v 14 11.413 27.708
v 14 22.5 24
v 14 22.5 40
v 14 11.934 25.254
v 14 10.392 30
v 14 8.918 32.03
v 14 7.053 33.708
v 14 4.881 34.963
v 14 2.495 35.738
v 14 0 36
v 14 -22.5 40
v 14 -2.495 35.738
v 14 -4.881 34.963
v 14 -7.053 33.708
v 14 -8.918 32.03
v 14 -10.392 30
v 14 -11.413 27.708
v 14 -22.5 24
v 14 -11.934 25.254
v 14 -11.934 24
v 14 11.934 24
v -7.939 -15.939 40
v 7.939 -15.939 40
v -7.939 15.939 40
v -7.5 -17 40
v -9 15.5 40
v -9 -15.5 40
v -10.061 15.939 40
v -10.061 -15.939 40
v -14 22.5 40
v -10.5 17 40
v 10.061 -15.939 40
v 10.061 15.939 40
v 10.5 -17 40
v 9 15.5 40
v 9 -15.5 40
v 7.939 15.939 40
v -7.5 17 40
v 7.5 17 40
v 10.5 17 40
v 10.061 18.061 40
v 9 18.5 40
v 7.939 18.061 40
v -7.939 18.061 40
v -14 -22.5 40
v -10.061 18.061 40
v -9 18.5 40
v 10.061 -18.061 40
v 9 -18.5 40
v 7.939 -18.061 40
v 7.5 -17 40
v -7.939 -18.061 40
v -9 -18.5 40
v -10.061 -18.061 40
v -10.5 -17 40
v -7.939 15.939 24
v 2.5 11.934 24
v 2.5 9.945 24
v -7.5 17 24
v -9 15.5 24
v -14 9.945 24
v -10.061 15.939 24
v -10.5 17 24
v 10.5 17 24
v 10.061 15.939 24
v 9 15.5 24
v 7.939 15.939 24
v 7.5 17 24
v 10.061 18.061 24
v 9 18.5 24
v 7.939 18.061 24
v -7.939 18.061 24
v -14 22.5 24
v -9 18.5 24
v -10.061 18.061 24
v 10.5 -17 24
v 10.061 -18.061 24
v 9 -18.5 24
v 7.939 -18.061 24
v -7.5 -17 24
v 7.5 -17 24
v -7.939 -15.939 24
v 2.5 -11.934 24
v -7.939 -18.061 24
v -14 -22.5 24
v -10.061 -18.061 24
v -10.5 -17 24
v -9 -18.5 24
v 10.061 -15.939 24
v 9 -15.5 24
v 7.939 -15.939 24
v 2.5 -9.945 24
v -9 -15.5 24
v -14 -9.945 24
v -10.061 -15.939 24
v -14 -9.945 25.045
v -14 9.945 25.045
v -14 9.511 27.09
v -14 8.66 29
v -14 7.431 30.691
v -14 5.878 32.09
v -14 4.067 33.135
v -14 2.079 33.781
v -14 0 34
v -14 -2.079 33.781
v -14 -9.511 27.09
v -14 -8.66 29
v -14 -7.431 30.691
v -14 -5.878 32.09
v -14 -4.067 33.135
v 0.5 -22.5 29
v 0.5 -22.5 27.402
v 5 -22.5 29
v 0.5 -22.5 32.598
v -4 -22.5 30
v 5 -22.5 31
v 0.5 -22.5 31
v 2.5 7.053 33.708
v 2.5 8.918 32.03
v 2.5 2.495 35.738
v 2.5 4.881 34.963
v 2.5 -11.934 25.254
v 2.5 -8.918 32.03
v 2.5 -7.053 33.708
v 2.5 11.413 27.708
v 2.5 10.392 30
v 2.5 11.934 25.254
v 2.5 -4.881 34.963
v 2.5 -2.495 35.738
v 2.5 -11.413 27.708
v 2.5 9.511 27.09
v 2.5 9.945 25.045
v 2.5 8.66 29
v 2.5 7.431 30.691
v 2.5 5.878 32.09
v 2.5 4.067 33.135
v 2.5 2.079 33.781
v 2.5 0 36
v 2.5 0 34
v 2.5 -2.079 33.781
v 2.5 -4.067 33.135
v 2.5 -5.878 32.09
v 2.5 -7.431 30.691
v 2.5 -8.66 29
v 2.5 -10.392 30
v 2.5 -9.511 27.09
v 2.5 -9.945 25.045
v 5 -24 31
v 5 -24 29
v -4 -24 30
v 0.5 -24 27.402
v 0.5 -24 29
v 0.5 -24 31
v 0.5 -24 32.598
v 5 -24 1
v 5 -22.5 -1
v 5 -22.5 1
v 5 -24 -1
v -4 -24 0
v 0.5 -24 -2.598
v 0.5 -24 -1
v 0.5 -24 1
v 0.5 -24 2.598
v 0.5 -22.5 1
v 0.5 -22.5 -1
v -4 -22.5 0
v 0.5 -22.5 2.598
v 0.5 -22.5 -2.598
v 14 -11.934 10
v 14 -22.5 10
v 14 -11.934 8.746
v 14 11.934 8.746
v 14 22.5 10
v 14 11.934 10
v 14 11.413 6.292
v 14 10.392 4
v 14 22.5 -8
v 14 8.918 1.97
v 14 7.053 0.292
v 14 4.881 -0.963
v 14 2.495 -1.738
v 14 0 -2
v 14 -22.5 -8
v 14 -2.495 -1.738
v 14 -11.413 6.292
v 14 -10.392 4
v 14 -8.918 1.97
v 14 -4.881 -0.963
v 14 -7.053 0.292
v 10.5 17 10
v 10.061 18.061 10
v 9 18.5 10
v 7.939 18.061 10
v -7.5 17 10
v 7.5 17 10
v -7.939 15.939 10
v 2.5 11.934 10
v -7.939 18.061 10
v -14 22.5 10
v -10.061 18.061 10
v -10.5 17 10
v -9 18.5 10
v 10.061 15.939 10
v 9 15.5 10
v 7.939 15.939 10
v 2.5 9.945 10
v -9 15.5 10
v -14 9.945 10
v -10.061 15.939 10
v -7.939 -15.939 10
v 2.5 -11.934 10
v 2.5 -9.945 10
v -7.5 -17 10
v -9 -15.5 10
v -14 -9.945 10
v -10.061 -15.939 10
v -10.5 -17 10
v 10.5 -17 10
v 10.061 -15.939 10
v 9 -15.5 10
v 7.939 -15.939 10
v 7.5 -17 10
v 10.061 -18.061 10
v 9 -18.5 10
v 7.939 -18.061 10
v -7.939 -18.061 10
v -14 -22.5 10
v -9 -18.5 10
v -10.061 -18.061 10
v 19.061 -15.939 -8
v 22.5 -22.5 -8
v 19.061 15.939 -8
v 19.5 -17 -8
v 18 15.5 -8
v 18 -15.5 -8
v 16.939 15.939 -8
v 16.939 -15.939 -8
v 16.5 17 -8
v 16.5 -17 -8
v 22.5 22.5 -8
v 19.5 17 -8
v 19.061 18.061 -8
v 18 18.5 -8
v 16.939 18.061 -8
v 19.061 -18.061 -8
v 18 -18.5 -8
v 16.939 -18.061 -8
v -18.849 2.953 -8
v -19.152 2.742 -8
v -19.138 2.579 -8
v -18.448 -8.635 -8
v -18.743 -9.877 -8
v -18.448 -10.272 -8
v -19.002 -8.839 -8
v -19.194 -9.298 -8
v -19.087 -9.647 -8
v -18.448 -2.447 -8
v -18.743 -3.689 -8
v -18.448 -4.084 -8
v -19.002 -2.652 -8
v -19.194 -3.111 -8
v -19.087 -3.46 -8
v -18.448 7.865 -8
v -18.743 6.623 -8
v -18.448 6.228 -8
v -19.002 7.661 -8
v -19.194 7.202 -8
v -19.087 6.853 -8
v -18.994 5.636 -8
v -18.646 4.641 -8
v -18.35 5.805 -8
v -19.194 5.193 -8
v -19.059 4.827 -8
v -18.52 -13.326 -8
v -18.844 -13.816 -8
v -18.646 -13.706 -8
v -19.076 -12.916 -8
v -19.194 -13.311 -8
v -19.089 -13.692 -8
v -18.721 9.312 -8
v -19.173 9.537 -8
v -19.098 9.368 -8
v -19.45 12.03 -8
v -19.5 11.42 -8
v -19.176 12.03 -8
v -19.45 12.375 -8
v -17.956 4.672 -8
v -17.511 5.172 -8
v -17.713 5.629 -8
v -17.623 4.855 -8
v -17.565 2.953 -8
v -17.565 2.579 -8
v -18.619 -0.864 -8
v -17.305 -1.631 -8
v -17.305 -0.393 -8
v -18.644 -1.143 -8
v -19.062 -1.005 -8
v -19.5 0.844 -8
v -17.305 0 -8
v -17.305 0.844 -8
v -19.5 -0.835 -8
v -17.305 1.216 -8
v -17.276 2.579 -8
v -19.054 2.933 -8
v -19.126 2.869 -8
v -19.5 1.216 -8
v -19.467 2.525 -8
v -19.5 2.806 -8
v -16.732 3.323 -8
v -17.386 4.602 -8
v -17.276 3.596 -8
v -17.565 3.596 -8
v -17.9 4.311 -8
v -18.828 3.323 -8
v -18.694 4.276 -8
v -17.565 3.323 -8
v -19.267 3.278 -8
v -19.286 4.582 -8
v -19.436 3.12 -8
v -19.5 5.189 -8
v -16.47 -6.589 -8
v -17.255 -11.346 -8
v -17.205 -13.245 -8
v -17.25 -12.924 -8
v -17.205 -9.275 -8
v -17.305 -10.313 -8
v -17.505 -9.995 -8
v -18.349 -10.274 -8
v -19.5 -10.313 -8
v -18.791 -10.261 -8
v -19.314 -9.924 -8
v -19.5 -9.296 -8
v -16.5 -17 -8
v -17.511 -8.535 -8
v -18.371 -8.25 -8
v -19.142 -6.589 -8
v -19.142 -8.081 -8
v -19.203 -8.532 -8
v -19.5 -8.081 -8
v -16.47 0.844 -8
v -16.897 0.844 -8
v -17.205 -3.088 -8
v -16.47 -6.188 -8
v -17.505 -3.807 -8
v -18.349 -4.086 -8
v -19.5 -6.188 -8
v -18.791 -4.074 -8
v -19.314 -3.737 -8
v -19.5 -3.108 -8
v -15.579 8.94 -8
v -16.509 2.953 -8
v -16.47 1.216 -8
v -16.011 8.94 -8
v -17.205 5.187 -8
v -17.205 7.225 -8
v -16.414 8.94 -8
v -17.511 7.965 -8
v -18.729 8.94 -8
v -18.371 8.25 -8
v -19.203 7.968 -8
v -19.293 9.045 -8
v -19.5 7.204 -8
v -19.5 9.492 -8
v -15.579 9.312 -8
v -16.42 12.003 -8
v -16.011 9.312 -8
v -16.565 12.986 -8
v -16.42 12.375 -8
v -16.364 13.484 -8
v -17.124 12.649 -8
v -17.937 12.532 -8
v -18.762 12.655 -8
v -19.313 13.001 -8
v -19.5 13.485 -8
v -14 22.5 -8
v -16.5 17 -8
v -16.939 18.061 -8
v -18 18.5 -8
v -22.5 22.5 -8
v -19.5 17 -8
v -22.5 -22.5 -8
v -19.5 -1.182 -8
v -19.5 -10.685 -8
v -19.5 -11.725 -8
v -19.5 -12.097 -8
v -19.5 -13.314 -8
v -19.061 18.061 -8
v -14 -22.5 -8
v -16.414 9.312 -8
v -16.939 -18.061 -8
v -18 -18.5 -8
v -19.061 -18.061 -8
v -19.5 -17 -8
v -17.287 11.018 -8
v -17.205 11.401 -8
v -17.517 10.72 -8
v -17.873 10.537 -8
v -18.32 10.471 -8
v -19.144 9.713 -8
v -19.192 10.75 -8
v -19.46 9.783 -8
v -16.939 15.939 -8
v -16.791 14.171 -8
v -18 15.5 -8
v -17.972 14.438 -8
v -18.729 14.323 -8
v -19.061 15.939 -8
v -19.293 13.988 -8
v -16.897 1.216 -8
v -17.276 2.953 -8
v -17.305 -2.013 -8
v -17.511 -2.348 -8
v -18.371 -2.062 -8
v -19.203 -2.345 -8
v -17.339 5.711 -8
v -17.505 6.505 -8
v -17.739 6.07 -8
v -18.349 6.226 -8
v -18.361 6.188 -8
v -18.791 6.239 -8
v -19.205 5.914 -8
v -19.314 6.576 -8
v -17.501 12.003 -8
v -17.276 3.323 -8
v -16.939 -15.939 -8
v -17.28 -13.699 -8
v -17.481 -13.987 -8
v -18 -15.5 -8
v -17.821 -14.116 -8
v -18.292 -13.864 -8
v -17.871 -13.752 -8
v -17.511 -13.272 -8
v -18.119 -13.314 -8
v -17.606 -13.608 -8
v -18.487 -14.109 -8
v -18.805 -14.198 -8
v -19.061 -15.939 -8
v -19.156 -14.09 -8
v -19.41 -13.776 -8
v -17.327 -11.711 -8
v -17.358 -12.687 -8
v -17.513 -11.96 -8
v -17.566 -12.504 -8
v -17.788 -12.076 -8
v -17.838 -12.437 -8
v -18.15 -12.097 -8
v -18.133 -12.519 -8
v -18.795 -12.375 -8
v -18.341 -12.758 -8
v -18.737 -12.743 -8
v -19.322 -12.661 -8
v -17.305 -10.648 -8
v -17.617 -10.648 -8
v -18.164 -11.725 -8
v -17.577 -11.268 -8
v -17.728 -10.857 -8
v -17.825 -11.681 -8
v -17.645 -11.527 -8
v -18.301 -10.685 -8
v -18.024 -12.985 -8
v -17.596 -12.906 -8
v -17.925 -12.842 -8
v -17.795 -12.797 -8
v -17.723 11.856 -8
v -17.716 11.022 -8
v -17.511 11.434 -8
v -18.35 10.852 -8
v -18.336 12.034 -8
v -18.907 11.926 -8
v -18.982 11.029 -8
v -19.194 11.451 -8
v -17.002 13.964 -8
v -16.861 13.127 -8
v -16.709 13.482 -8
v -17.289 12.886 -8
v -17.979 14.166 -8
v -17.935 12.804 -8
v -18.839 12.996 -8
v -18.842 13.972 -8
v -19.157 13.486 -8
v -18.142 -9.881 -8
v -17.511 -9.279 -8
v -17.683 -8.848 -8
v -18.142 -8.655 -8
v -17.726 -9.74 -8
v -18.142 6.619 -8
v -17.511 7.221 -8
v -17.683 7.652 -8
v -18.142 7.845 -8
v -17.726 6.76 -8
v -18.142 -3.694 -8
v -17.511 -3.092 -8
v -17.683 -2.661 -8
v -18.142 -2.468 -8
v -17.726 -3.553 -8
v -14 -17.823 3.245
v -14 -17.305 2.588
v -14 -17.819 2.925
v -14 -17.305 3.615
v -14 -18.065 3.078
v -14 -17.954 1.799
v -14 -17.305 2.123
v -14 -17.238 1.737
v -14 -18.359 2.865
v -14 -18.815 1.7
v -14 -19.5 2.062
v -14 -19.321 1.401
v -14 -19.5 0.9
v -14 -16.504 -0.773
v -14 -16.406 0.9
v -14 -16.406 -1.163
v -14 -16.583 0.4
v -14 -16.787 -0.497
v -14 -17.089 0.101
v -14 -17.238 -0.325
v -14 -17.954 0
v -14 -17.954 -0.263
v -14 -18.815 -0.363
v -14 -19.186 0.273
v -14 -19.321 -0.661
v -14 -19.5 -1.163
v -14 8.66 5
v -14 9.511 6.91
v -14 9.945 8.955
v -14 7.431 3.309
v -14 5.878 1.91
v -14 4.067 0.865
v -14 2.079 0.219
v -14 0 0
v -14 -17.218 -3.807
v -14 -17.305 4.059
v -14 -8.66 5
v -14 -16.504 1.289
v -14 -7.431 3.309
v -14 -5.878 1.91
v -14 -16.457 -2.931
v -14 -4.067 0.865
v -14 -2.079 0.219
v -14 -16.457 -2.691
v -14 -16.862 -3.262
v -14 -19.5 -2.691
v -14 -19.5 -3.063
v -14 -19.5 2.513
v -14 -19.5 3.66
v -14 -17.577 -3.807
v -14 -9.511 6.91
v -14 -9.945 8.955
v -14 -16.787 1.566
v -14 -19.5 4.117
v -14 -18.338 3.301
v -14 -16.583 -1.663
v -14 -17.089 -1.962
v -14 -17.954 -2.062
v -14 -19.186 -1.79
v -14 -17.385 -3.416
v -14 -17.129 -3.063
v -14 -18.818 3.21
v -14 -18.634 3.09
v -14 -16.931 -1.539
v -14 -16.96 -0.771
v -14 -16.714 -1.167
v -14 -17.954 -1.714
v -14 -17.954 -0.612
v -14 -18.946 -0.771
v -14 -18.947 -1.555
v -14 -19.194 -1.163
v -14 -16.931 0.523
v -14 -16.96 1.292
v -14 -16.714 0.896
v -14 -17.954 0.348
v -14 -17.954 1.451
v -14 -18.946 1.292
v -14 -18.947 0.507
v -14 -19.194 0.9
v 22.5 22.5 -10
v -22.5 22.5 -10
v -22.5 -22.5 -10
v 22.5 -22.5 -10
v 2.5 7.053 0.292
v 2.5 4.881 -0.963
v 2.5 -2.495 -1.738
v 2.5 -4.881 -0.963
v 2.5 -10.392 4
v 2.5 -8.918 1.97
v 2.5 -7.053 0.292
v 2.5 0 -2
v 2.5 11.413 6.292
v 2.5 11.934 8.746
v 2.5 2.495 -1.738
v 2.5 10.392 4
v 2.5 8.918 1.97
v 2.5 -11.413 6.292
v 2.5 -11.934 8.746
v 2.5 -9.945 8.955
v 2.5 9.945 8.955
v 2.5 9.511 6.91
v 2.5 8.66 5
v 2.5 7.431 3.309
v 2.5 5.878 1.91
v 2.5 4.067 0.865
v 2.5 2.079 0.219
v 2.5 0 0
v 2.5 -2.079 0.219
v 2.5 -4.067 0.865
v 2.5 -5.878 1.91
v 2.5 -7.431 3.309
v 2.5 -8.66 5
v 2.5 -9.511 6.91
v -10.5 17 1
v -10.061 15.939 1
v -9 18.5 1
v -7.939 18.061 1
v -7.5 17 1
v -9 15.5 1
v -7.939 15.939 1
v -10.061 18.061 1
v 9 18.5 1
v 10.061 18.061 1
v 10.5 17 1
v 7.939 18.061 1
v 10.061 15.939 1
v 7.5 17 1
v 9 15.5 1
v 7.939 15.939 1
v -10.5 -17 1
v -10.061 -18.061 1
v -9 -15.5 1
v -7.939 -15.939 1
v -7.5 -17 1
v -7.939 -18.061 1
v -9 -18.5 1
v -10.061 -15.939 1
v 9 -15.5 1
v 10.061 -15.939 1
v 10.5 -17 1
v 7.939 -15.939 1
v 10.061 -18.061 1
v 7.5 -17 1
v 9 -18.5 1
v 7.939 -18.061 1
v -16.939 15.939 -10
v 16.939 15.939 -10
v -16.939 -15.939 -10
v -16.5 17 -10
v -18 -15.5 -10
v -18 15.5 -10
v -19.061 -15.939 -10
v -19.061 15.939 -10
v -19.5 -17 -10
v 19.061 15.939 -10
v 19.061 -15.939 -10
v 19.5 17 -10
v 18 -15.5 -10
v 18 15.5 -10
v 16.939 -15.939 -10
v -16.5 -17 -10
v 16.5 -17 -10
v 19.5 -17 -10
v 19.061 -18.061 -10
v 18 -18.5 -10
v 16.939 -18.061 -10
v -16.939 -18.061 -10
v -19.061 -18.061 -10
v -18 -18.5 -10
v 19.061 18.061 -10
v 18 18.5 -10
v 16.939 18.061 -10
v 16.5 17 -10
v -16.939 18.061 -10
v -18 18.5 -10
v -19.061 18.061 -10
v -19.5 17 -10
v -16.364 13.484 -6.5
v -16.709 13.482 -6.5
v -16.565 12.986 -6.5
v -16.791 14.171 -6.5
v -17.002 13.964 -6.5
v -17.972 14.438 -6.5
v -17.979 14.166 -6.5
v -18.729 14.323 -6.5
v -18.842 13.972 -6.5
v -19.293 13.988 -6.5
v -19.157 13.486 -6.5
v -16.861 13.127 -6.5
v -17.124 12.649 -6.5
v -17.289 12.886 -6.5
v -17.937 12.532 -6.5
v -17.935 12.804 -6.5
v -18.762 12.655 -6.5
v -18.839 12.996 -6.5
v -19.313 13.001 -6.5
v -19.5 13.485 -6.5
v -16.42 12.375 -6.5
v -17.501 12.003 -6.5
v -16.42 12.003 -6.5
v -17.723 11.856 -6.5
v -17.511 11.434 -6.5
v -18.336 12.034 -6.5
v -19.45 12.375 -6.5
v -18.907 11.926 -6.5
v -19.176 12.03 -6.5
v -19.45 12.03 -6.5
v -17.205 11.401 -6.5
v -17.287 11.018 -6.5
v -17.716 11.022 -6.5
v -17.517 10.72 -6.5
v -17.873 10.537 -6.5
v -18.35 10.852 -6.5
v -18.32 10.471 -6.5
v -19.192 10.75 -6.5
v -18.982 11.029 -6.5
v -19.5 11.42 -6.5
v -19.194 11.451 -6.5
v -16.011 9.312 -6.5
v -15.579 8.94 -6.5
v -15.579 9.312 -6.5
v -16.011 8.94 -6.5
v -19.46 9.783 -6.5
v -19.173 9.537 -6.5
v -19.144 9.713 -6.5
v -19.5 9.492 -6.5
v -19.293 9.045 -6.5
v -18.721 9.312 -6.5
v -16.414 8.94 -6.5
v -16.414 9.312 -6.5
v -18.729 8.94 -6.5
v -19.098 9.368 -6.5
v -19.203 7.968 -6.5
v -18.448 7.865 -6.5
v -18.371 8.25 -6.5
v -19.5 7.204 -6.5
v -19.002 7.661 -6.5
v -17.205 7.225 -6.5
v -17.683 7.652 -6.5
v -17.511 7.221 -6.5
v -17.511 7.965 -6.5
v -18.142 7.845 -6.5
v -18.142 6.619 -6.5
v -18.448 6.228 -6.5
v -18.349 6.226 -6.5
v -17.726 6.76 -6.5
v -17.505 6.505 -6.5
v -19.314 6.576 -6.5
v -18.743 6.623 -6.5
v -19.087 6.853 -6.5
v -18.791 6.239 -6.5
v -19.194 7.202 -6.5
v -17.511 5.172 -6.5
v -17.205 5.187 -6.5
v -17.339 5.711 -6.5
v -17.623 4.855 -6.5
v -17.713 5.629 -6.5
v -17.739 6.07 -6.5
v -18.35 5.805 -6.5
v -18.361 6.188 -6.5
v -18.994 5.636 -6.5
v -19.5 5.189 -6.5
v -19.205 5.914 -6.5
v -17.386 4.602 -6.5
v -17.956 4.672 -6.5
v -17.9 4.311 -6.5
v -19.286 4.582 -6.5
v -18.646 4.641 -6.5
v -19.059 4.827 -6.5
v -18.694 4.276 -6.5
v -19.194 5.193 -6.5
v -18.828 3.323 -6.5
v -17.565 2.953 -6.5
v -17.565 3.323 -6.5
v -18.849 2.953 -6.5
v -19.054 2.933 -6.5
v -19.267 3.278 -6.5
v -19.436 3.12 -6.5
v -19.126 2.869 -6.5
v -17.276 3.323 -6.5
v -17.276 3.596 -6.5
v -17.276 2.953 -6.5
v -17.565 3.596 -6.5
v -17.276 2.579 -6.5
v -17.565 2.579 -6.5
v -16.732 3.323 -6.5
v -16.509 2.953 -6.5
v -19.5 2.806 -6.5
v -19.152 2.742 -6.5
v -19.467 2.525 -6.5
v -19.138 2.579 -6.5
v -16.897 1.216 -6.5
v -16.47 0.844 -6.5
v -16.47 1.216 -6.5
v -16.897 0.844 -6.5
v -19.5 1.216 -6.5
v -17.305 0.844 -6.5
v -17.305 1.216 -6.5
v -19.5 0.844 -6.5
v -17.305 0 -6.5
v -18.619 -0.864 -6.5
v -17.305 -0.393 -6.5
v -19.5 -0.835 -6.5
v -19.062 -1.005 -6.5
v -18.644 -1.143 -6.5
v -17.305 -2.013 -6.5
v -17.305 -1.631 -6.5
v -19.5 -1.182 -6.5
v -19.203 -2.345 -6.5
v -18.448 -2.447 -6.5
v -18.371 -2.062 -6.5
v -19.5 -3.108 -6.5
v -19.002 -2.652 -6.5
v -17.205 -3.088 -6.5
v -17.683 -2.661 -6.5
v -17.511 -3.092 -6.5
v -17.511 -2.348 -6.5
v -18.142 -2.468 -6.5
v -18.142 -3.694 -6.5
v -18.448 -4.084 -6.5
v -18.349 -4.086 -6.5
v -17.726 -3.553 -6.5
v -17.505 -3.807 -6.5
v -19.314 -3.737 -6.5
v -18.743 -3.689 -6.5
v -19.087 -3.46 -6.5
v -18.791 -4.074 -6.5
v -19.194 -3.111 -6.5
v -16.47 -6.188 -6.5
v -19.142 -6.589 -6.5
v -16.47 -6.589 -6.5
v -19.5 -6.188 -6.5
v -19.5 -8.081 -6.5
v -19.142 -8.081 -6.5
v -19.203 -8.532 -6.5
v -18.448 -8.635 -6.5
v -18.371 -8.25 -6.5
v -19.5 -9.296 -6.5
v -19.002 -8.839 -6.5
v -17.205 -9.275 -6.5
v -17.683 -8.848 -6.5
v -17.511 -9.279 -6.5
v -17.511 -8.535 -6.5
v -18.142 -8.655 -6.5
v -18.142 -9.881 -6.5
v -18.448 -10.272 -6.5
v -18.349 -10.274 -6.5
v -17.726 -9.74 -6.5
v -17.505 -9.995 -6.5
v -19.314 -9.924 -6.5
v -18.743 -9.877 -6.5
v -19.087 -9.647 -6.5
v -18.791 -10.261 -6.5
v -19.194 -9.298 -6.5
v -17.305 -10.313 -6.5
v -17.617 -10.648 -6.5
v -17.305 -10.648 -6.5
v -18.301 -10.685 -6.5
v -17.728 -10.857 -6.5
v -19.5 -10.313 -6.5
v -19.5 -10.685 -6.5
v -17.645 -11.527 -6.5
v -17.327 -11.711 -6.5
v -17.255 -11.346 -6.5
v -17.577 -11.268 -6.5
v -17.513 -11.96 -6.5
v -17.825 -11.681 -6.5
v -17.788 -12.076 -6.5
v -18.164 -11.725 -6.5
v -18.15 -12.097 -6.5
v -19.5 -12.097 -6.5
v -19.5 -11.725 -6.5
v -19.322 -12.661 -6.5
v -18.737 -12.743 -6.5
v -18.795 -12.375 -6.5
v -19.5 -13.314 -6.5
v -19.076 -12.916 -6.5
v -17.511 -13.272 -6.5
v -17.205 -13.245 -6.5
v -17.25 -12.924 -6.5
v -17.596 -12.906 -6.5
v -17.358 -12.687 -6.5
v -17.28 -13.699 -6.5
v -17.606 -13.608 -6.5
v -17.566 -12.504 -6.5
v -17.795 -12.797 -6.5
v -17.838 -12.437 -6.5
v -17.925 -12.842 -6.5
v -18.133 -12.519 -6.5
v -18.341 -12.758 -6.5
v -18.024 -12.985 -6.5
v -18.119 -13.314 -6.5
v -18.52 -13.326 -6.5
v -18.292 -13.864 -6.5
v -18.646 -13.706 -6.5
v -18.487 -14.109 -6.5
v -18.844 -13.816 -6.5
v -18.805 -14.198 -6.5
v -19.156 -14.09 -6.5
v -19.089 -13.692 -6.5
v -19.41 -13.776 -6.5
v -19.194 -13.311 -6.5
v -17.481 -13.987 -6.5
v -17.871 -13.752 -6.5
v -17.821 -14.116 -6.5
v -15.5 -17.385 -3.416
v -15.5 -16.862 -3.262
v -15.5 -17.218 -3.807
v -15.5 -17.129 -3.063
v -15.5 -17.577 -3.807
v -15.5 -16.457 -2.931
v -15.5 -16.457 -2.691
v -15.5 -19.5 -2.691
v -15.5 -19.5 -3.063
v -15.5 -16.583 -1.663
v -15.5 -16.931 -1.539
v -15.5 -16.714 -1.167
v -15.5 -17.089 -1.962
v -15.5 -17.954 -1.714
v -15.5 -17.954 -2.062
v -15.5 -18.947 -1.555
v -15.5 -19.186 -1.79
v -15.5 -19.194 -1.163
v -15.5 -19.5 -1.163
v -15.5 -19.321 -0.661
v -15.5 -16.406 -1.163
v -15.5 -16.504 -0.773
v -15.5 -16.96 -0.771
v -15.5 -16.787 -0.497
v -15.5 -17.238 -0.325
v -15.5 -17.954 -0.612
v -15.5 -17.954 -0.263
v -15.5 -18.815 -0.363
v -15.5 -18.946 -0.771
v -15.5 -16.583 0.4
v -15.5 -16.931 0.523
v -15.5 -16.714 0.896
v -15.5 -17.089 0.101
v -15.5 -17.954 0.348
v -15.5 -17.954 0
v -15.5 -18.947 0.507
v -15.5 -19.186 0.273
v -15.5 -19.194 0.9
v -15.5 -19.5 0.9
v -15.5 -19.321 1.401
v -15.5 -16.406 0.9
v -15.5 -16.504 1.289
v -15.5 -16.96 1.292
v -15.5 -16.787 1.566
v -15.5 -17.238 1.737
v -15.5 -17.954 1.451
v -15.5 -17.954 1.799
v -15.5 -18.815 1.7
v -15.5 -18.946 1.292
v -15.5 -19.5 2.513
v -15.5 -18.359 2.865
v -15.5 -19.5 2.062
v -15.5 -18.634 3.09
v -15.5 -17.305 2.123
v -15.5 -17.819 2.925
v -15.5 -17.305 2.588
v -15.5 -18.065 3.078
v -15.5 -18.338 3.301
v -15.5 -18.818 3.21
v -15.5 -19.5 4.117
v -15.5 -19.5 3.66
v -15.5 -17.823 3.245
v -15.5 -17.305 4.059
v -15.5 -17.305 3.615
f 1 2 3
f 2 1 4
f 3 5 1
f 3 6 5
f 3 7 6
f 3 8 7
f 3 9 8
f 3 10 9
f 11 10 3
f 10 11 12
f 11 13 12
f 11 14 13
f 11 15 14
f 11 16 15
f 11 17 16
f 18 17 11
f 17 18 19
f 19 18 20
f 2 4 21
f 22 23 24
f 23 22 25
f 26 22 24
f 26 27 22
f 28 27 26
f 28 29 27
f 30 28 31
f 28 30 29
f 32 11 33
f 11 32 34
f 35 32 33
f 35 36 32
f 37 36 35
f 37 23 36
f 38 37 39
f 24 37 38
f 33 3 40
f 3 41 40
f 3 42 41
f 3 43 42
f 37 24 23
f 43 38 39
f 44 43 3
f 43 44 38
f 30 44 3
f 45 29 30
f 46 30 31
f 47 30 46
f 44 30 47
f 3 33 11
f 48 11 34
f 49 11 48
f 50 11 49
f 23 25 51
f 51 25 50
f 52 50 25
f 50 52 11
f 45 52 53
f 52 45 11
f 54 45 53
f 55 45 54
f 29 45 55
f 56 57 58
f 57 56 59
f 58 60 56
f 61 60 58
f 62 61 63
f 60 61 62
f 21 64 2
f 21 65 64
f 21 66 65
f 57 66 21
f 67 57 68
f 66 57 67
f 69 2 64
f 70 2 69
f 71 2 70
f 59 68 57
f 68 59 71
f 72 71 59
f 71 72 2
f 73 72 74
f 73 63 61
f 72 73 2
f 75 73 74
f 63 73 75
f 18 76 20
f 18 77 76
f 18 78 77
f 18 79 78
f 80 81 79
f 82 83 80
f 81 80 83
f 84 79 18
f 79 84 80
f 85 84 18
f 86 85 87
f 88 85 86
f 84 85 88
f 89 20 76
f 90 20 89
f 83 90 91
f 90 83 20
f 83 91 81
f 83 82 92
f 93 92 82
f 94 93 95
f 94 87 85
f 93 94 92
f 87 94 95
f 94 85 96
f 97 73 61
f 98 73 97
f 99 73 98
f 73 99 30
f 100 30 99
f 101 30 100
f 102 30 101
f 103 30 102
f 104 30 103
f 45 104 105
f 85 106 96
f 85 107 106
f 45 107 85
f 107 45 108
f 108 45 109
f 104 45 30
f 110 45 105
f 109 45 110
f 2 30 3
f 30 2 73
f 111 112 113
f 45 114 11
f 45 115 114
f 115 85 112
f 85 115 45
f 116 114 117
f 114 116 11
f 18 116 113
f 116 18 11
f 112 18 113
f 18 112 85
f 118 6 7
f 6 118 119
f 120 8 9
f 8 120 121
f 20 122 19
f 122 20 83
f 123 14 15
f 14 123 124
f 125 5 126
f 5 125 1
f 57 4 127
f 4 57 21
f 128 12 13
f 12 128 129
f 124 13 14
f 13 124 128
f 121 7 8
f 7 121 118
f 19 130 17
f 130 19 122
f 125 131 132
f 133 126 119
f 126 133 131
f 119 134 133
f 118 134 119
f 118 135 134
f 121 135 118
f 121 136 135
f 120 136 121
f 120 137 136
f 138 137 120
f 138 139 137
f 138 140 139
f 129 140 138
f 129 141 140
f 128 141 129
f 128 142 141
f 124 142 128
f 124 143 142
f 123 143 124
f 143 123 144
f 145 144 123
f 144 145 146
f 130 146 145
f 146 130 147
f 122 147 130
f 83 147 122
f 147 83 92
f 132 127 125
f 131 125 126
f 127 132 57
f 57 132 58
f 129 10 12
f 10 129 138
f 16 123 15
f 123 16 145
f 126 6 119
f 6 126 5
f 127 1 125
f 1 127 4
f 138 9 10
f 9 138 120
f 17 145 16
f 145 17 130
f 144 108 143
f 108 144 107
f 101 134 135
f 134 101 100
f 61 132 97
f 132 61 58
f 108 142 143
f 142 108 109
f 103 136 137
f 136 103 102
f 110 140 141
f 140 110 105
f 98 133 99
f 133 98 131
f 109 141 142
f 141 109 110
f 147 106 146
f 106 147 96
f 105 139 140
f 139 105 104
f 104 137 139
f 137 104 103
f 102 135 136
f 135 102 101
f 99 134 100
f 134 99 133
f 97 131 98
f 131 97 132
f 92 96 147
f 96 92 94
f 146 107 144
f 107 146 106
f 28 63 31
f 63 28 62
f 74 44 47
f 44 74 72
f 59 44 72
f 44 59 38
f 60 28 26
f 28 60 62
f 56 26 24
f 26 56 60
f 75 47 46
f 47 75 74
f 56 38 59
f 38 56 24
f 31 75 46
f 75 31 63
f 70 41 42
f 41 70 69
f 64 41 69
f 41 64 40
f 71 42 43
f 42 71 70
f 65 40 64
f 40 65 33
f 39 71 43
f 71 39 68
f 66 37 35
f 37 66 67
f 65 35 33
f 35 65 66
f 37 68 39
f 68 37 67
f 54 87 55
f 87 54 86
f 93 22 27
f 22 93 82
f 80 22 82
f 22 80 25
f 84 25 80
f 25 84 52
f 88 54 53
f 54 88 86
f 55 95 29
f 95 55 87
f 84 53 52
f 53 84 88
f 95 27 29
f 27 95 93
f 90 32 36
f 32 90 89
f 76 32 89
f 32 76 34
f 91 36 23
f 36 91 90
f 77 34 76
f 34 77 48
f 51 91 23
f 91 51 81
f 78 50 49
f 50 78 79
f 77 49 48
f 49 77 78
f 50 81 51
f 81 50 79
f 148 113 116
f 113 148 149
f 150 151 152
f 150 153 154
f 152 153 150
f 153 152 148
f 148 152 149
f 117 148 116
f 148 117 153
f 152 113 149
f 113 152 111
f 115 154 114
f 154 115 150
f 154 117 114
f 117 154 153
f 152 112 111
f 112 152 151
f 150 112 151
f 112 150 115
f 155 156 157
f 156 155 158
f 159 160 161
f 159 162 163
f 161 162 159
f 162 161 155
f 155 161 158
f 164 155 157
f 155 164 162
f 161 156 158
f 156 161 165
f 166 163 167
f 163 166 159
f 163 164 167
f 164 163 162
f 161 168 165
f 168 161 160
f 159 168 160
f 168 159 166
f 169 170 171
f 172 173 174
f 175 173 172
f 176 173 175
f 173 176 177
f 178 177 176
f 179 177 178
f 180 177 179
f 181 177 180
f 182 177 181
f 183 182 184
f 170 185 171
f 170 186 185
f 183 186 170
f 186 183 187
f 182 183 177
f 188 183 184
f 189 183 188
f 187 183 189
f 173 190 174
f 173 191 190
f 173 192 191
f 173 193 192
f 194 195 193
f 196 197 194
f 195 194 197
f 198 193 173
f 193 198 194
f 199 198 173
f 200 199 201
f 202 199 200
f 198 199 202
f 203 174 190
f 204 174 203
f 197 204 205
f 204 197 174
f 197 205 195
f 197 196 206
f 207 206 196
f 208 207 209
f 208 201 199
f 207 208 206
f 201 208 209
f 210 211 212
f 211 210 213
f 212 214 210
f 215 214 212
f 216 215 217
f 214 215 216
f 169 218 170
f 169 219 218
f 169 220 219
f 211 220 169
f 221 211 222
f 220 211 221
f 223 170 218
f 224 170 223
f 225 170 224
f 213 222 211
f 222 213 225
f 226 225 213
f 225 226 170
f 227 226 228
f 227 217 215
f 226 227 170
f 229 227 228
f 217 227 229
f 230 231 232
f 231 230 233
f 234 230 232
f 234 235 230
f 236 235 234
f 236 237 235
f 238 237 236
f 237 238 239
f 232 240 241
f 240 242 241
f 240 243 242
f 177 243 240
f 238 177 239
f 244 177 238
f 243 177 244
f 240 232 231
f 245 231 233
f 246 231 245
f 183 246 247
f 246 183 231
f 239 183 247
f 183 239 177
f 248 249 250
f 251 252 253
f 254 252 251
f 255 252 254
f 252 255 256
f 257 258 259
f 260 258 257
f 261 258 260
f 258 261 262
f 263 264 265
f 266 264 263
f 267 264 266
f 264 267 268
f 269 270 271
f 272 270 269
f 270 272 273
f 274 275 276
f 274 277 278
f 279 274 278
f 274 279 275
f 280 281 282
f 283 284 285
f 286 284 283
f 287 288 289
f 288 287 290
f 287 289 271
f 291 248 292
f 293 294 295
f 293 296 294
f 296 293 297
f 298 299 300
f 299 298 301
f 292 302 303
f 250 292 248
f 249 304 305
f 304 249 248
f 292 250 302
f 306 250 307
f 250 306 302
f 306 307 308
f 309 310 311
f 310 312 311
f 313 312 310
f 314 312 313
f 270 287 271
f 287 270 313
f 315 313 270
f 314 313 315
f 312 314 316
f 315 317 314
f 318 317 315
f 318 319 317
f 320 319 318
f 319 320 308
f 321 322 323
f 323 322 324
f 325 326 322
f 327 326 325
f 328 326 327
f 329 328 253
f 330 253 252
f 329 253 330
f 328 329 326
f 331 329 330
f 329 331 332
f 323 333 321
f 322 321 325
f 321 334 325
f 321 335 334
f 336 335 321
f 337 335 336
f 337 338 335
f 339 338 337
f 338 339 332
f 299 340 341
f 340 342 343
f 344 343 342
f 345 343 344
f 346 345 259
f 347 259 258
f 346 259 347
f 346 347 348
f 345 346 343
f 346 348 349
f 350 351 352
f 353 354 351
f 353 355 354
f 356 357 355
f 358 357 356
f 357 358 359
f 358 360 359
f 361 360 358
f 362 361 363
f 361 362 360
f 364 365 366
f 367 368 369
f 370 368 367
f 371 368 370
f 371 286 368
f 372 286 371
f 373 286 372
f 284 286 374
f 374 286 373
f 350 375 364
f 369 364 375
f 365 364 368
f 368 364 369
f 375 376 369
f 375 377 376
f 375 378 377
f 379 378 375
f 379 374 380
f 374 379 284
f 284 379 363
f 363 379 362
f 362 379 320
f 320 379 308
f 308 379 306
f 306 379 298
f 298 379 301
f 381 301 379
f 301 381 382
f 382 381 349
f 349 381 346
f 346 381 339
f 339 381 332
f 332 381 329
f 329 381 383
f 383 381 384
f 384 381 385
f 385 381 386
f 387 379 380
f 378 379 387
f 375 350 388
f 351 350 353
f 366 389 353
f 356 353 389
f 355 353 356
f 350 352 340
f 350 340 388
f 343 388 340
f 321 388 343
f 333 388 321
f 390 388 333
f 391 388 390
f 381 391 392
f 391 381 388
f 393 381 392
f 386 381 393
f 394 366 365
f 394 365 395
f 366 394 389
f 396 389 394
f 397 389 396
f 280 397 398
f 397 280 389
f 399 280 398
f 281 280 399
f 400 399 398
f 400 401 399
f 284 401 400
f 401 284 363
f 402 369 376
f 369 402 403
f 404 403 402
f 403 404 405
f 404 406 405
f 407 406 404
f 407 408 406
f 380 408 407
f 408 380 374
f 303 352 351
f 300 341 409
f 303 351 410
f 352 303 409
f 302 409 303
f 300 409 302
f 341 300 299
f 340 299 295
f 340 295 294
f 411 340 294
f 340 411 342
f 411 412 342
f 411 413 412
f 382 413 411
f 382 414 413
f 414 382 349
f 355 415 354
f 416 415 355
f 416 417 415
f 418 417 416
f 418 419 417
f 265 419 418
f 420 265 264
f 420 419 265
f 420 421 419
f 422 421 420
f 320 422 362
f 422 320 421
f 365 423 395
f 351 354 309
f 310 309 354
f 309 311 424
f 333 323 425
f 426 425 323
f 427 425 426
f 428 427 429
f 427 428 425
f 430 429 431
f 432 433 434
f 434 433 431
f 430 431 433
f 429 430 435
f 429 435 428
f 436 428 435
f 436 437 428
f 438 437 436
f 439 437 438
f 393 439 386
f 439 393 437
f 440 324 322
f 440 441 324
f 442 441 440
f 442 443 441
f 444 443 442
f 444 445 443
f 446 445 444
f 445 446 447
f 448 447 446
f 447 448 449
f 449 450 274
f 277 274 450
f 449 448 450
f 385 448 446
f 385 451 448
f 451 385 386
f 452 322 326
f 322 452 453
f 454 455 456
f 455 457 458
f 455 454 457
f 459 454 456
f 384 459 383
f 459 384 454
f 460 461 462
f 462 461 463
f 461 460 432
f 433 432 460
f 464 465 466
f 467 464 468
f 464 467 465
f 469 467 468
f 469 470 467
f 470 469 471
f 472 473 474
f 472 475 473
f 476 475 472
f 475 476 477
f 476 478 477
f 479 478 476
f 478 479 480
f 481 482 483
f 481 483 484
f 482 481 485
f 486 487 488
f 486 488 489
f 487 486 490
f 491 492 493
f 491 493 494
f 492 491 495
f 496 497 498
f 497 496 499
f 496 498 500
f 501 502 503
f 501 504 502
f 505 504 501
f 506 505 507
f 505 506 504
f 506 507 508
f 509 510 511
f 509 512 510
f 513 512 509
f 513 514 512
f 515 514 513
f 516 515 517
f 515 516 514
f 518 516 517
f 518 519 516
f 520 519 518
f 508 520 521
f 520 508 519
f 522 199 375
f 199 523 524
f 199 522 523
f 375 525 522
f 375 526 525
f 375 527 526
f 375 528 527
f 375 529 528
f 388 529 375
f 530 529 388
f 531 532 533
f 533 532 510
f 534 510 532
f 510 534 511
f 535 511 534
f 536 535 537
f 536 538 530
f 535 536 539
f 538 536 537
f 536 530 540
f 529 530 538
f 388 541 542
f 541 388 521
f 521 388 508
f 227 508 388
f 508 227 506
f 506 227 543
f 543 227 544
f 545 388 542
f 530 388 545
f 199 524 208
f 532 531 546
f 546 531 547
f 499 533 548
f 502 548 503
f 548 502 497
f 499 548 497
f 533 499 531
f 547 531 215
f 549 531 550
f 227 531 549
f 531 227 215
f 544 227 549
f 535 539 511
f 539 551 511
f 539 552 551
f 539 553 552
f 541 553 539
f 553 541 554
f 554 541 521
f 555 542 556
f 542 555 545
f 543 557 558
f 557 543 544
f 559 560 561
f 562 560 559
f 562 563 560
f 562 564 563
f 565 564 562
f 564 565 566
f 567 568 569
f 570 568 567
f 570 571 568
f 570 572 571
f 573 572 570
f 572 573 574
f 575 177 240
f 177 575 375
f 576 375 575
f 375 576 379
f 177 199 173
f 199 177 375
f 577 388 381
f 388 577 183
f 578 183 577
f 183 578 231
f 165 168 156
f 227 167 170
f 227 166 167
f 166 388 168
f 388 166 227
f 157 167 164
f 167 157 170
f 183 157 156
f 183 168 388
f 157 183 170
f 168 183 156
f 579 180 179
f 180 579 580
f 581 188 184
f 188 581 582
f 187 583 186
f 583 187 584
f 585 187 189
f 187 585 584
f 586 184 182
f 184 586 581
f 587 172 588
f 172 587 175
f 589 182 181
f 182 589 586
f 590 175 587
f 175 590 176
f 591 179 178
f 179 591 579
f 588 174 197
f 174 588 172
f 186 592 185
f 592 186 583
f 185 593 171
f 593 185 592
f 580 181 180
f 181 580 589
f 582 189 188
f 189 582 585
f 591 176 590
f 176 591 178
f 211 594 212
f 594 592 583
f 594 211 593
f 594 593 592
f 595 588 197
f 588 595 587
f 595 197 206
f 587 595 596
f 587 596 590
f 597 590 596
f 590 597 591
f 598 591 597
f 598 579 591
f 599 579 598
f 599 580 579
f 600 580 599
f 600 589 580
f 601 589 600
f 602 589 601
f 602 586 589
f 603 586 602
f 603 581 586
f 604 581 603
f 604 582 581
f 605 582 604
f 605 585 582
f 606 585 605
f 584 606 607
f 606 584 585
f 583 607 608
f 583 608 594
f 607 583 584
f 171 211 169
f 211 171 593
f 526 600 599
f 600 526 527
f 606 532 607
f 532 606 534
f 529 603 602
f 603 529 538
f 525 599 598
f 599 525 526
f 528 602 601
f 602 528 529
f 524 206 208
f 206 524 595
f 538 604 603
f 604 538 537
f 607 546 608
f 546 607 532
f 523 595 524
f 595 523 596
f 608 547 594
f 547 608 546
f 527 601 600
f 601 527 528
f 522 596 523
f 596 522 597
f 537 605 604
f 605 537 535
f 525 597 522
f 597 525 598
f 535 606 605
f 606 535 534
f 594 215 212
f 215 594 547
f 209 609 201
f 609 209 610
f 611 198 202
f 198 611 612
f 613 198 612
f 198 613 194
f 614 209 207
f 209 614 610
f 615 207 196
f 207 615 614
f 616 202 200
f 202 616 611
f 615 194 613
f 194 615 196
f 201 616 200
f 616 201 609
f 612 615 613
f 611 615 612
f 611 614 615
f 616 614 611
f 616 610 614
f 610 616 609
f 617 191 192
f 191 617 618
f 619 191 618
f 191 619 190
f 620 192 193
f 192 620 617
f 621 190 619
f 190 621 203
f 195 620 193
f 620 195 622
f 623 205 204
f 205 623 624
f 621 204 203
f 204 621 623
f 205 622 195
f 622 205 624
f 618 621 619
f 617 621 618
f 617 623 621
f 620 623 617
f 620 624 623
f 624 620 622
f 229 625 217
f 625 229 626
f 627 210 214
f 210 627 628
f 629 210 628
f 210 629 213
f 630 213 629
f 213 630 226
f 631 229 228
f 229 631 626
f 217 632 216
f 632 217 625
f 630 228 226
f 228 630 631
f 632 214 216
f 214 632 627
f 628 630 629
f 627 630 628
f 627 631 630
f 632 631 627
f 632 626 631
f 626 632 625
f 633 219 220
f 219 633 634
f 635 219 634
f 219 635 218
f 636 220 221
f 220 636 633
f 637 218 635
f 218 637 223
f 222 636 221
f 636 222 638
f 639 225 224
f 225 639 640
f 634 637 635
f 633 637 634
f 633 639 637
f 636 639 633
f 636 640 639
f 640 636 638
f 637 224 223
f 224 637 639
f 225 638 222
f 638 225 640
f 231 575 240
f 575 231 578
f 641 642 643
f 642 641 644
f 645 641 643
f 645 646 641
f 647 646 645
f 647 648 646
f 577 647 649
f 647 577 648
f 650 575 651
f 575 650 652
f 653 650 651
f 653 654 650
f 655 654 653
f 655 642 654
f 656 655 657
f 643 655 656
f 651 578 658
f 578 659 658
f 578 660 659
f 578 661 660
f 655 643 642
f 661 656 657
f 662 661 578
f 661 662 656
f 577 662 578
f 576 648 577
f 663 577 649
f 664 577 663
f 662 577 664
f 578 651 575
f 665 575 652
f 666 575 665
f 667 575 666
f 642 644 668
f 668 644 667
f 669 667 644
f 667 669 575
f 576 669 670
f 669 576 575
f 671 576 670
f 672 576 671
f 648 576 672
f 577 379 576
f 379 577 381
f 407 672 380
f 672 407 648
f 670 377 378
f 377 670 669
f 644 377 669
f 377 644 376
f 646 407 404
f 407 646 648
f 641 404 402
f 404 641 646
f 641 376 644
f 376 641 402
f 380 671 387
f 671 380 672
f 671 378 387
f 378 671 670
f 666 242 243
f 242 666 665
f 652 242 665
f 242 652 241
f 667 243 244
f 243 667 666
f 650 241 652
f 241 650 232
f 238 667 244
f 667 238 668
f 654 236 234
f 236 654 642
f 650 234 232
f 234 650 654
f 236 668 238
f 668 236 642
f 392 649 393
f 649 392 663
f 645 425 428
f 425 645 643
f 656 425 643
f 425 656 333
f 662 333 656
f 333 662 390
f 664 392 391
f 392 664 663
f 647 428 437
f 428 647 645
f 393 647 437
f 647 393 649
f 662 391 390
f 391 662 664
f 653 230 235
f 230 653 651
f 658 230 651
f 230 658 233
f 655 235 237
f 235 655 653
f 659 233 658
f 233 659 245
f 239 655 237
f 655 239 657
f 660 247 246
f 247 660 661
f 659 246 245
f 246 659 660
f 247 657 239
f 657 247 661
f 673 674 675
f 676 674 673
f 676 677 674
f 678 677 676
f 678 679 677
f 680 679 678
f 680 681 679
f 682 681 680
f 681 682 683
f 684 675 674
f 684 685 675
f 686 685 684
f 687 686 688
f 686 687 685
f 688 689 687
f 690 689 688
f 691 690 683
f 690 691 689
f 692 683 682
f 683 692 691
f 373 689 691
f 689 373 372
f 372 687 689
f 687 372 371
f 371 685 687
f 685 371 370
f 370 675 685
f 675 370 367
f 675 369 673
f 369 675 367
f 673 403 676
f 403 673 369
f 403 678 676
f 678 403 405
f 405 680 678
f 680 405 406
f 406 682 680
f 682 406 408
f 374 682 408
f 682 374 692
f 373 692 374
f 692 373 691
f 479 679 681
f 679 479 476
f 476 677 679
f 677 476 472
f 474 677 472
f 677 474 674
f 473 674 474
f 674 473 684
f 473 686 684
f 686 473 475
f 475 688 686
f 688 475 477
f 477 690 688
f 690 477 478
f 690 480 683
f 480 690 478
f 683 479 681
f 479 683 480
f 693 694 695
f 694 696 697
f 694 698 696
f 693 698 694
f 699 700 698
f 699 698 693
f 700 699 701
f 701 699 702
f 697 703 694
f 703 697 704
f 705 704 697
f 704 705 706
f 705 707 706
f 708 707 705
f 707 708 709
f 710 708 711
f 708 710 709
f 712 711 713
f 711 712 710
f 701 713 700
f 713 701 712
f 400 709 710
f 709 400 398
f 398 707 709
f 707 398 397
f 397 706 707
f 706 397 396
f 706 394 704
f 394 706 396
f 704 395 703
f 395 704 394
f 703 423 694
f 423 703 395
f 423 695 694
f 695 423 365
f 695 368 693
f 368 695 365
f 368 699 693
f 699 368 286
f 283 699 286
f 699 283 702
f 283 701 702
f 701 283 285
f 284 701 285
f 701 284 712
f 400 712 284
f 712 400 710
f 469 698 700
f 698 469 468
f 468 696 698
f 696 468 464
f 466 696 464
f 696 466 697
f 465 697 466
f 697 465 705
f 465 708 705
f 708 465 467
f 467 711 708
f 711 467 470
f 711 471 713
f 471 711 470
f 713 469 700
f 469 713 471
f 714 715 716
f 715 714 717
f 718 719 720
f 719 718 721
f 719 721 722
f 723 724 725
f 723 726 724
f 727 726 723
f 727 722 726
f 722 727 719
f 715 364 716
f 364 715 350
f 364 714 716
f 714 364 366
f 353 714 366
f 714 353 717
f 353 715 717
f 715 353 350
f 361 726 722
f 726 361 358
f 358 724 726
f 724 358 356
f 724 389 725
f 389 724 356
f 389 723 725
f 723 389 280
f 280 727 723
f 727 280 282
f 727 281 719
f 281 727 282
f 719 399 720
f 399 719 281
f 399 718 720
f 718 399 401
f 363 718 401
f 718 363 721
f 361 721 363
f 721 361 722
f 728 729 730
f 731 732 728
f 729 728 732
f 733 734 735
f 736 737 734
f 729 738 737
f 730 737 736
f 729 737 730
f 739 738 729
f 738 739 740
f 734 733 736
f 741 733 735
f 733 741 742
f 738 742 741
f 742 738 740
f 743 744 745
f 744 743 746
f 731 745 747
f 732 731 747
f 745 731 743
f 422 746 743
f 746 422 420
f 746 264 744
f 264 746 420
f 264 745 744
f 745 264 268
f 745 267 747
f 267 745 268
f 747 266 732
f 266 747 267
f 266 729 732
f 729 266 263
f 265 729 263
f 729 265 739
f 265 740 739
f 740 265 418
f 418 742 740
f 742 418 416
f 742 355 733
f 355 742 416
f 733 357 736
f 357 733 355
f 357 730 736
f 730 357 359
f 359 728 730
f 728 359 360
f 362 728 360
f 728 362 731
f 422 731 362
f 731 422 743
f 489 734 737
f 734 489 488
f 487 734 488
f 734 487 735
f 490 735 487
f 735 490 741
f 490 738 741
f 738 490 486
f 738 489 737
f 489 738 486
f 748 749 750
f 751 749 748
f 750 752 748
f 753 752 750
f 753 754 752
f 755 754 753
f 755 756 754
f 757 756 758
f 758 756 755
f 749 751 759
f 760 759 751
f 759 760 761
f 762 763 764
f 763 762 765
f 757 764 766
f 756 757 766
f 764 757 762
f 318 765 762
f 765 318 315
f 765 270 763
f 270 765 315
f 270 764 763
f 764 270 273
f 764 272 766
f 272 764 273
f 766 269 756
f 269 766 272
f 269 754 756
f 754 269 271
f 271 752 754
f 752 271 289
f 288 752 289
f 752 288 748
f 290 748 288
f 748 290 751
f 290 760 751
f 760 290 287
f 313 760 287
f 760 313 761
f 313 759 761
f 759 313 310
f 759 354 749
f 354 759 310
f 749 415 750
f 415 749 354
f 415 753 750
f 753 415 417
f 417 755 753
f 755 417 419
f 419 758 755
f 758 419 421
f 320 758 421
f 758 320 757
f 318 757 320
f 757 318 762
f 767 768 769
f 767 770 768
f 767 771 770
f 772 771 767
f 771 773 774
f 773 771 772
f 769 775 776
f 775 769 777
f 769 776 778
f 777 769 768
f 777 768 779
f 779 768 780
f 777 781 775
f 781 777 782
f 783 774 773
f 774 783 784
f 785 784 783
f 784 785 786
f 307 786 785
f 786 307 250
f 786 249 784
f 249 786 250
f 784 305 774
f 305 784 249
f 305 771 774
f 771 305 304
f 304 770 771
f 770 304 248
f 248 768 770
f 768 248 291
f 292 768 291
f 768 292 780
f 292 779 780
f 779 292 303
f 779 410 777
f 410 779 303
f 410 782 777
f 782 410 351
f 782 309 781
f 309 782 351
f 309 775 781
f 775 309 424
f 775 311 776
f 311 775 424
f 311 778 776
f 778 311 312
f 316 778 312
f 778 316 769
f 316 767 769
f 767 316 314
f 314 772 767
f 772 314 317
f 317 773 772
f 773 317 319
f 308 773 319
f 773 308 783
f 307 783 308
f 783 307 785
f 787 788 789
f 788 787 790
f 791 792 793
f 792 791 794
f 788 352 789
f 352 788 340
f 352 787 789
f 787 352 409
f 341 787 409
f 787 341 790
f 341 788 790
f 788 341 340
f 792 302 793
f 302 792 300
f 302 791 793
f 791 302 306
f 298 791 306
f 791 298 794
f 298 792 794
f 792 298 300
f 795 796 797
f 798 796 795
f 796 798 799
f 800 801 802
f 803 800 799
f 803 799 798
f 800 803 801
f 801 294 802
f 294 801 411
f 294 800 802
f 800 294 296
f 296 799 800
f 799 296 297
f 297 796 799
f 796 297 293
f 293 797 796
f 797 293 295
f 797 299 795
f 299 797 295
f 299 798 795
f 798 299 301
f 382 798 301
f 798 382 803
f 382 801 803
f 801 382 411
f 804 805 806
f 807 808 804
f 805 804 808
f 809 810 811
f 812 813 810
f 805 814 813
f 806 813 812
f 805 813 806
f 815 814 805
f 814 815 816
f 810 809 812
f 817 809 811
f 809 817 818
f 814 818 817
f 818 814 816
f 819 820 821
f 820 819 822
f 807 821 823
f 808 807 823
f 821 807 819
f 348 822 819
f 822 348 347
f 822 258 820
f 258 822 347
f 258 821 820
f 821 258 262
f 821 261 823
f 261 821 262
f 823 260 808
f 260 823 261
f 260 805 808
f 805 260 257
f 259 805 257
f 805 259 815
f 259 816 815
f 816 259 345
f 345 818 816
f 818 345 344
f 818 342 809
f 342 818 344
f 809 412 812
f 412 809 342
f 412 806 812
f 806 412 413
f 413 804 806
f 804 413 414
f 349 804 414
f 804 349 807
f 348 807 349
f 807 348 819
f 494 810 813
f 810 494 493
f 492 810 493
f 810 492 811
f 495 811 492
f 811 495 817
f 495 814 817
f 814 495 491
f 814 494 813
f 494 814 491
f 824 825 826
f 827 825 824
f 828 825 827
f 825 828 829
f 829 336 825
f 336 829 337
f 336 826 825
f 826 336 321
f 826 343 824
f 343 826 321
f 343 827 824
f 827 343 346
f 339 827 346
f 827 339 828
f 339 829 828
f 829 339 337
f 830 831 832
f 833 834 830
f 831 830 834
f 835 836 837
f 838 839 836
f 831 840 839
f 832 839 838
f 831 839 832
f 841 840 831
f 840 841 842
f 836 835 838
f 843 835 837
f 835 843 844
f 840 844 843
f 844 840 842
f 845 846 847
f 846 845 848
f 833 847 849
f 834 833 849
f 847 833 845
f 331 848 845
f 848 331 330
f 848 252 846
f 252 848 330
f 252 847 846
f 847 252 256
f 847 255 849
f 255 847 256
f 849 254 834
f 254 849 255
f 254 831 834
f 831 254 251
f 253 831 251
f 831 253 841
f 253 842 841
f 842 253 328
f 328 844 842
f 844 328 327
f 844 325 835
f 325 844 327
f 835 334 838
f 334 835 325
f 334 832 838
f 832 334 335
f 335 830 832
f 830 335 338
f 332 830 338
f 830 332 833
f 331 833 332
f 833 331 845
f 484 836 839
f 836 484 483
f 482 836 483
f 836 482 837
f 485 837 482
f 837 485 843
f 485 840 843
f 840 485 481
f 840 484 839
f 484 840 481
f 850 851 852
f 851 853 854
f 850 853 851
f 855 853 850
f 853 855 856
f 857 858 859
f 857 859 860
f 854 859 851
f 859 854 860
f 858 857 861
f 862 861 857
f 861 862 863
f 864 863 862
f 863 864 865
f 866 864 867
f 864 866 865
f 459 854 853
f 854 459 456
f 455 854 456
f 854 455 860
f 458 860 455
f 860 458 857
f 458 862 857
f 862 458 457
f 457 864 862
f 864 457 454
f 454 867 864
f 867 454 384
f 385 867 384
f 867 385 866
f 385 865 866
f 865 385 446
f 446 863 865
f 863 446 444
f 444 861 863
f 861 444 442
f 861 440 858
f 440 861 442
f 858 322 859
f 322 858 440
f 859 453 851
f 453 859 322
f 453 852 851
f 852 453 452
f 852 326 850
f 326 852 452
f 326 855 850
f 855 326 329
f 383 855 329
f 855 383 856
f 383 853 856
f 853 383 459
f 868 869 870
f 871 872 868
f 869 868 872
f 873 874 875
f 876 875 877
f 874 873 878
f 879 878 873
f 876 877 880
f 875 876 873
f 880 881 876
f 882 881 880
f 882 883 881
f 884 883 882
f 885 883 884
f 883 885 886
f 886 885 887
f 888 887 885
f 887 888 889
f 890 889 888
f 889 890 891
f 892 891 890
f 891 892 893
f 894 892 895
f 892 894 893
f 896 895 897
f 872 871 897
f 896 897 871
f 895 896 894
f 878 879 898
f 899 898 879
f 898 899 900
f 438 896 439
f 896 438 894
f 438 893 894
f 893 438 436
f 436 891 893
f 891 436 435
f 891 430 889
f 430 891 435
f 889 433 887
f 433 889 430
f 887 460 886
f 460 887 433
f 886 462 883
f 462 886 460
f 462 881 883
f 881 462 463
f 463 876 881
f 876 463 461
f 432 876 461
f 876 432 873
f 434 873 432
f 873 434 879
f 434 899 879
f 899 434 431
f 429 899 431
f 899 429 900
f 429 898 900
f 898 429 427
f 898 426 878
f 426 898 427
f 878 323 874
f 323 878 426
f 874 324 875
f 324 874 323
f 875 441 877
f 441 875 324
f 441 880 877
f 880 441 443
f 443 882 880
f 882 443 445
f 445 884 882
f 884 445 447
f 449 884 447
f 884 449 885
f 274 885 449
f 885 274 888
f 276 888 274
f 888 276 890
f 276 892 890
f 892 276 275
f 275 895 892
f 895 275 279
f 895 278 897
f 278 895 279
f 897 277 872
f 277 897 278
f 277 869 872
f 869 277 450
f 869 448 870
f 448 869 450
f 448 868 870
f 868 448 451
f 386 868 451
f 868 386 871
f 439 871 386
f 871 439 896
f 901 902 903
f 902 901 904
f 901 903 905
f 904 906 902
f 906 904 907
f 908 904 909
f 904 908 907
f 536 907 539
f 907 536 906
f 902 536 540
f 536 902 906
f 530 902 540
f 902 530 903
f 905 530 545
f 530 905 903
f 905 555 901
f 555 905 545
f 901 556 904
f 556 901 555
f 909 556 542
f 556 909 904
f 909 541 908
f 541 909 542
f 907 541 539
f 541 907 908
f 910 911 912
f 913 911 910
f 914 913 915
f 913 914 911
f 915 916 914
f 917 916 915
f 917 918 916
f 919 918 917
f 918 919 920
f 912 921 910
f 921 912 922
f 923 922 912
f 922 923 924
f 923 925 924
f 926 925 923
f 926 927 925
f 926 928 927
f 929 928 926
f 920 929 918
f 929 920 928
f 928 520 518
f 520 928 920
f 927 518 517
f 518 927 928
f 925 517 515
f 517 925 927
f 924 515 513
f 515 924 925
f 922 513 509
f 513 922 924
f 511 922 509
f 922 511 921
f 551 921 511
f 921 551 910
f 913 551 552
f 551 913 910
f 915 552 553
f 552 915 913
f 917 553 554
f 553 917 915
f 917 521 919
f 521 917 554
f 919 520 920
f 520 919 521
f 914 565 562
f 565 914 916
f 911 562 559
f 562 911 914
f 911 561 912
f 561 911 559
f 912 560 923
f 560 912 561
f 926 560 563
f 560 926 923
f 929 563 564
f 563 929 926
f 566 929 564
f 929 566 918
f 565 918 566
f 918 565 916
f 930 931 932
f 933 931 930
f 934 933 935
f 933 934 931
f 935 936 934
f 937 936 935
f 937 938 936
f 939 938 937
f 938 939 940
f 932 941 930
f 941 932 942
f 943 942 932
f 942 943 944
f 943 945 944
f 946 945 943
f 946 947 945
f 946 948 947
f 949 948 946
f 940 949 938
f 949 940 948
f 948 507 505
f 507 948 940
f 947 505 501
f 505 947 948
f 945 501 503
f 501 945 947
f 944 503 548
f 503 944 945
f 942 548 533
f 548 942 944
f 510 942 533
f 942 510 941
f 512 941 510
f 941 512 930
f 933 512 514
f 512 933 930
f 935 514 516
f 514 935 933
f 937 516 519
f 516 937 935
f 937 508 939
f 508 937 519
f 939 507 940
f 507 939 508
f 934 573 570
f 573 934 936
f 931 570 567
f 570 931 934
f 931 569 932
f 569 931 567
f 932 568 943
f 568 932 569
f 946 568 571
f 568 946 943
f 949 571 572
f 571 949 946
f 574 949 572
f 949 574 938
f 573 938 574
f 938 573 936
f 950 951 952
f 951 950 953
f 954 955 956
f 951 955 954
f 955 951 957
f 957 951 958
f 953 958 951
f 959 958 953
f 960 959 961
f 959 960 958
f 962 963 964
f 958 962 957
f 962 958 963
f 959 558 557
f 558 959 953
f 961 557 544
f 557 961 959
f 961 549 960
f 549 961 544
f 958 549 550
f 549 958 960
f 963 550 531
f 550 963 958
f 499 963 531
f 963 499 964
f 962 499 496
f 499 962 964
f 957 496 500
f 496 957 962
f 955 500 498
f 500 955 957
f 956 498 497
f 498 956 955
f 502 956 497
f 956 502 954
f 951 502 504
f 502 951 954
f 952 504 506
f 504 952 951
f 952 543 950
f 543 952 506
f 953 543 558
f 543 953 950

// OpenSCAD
// file: ../arrow.scad
module arrow(){
	//arrowBody
	translate([0,-1,0]) color([0,1,1]) cube(size=[2.5,2,5]);
	//arrowHead
	translate([0,0,-1]) color([0,1,1]) rotate([0,90,0]) cylinder(h=2.5,r=3,$fn=3);
}

arrow();
// file: ../opticsMount_objectiveLens_bottom.scad
use <write.scad>
use <arrow.scad>

module objectiveLensMountBottom(){
	difference(){
		//mainBody
		translate([0,0,1]) color([0,.6,.5]) cube(size=[28,45,18],center=true);
		//lensHole
		translate([9,0,10]) rotate([0,90,0]) cylinder(h=13,r=12,center=true);
		translate([-6,0,10]) rotate([0,90,0]) cylinder(h=18,r=10,center=true);
		//screwHoles
		translate([-9,17,6]) color([1,0,0]) cylinder(h=10,r=1.5,$fn=8,center=true);
		translate([9,17,6]) color([1,0,0]) cylinder(h=10,r=1.5,$fn=8,center=true);
		translate([-9,-17,6]) color([1,0,0]) cylinder(h=10,r=1.5,$fn=8,center=true);
		translate([9,-17,6]) color([1,0,0]) cylinder(h=10,r=1.5,$fn=8,center=true);
	}
	difference(){
		//base
		translate([0,0,-9]) color([0,.6,.5]) cube(size=[45,45,2],center=true);
		//screwHoles
		translate([-18,17,-9]) color([1,0,0]) cylinder(h=4,r=1.5,$fn=8,center=true);
		translate([18,17,-9]) color([1,0,0]) cylinder(h=4,r=1.5,$fn=8,center=true);
		translate([-18,-17,-9]) color([1,0,0]) cylinder(h=4,r=1.5,$fn=8,center=true);
		translate([18,-17,-9]) color([1,0,0]) cylinder(h=4,r=1.5,$fn=8,center=true);
	}
	//arrow
	translate([0,-24,0]){
		rotate([90,0,90]){
			arrow();
		}
	}
	rotate([0,0,-90]){
		translate([0,-18,-8]){
			write("Objective Lens",h=3,t=3,center=true);
		}
	}
	rotate([0,-90,0]){
		translate([0,-18,14]){
			write("100x",h=3,t=3,center=true);
		}
	}
}

translate([0,0,0]){
	objectiveLensMountBottom();
}
// file: ../opticsMount_objectiveLens_top.scad
use <arrow.scad>

module objectiveLensMountTop(){
	difference(){
		//mainBody
		translate([0,0,2]) color([0,.6,.5]) cube(size=[28,45,16],center=true);
		//lensHole
		translate([9,0,-6]) rotate([0,90,0]) cylinder(h=13,r=12,center=true);
		translate([-6,0,-6]) rotate([0,90,0]) cylinder(h=18,r=10,center=true);
		//screwHoles
		translate([-9,17,2]) color([1,0,0]) cylinder(h=18,r=1.5,$fn=8,center=true);
		translate([9,17,2]) color([1,0,0]) cylinder(h=18,r=1.5,$fn=8,center=true);
		translate([-9,-17,2]) color([1,0,0]) cylinder(h=18,r=1.5,$fn=8,center=true);
		translate([9,-17,2]) color([1,0,0]) cylinder(h=18,r=1.5,$fn=8,center=true);
	}
	translate([0,-24,0]){
		rotate([90,0,90]){
			arrow();
		}
	}
}

translate([0,0,0]){
	objectiveLensMountTop();
}
// main file
use <../opticsMount_objectiveLens_top.scad>
use <../opticsMount_objectiveLens_bottom.scad>

translate([0,0,30]){
	objectiveLensMountTop();
}
translate([0,0,0]){
	objectiveLensMountBottom();
}
